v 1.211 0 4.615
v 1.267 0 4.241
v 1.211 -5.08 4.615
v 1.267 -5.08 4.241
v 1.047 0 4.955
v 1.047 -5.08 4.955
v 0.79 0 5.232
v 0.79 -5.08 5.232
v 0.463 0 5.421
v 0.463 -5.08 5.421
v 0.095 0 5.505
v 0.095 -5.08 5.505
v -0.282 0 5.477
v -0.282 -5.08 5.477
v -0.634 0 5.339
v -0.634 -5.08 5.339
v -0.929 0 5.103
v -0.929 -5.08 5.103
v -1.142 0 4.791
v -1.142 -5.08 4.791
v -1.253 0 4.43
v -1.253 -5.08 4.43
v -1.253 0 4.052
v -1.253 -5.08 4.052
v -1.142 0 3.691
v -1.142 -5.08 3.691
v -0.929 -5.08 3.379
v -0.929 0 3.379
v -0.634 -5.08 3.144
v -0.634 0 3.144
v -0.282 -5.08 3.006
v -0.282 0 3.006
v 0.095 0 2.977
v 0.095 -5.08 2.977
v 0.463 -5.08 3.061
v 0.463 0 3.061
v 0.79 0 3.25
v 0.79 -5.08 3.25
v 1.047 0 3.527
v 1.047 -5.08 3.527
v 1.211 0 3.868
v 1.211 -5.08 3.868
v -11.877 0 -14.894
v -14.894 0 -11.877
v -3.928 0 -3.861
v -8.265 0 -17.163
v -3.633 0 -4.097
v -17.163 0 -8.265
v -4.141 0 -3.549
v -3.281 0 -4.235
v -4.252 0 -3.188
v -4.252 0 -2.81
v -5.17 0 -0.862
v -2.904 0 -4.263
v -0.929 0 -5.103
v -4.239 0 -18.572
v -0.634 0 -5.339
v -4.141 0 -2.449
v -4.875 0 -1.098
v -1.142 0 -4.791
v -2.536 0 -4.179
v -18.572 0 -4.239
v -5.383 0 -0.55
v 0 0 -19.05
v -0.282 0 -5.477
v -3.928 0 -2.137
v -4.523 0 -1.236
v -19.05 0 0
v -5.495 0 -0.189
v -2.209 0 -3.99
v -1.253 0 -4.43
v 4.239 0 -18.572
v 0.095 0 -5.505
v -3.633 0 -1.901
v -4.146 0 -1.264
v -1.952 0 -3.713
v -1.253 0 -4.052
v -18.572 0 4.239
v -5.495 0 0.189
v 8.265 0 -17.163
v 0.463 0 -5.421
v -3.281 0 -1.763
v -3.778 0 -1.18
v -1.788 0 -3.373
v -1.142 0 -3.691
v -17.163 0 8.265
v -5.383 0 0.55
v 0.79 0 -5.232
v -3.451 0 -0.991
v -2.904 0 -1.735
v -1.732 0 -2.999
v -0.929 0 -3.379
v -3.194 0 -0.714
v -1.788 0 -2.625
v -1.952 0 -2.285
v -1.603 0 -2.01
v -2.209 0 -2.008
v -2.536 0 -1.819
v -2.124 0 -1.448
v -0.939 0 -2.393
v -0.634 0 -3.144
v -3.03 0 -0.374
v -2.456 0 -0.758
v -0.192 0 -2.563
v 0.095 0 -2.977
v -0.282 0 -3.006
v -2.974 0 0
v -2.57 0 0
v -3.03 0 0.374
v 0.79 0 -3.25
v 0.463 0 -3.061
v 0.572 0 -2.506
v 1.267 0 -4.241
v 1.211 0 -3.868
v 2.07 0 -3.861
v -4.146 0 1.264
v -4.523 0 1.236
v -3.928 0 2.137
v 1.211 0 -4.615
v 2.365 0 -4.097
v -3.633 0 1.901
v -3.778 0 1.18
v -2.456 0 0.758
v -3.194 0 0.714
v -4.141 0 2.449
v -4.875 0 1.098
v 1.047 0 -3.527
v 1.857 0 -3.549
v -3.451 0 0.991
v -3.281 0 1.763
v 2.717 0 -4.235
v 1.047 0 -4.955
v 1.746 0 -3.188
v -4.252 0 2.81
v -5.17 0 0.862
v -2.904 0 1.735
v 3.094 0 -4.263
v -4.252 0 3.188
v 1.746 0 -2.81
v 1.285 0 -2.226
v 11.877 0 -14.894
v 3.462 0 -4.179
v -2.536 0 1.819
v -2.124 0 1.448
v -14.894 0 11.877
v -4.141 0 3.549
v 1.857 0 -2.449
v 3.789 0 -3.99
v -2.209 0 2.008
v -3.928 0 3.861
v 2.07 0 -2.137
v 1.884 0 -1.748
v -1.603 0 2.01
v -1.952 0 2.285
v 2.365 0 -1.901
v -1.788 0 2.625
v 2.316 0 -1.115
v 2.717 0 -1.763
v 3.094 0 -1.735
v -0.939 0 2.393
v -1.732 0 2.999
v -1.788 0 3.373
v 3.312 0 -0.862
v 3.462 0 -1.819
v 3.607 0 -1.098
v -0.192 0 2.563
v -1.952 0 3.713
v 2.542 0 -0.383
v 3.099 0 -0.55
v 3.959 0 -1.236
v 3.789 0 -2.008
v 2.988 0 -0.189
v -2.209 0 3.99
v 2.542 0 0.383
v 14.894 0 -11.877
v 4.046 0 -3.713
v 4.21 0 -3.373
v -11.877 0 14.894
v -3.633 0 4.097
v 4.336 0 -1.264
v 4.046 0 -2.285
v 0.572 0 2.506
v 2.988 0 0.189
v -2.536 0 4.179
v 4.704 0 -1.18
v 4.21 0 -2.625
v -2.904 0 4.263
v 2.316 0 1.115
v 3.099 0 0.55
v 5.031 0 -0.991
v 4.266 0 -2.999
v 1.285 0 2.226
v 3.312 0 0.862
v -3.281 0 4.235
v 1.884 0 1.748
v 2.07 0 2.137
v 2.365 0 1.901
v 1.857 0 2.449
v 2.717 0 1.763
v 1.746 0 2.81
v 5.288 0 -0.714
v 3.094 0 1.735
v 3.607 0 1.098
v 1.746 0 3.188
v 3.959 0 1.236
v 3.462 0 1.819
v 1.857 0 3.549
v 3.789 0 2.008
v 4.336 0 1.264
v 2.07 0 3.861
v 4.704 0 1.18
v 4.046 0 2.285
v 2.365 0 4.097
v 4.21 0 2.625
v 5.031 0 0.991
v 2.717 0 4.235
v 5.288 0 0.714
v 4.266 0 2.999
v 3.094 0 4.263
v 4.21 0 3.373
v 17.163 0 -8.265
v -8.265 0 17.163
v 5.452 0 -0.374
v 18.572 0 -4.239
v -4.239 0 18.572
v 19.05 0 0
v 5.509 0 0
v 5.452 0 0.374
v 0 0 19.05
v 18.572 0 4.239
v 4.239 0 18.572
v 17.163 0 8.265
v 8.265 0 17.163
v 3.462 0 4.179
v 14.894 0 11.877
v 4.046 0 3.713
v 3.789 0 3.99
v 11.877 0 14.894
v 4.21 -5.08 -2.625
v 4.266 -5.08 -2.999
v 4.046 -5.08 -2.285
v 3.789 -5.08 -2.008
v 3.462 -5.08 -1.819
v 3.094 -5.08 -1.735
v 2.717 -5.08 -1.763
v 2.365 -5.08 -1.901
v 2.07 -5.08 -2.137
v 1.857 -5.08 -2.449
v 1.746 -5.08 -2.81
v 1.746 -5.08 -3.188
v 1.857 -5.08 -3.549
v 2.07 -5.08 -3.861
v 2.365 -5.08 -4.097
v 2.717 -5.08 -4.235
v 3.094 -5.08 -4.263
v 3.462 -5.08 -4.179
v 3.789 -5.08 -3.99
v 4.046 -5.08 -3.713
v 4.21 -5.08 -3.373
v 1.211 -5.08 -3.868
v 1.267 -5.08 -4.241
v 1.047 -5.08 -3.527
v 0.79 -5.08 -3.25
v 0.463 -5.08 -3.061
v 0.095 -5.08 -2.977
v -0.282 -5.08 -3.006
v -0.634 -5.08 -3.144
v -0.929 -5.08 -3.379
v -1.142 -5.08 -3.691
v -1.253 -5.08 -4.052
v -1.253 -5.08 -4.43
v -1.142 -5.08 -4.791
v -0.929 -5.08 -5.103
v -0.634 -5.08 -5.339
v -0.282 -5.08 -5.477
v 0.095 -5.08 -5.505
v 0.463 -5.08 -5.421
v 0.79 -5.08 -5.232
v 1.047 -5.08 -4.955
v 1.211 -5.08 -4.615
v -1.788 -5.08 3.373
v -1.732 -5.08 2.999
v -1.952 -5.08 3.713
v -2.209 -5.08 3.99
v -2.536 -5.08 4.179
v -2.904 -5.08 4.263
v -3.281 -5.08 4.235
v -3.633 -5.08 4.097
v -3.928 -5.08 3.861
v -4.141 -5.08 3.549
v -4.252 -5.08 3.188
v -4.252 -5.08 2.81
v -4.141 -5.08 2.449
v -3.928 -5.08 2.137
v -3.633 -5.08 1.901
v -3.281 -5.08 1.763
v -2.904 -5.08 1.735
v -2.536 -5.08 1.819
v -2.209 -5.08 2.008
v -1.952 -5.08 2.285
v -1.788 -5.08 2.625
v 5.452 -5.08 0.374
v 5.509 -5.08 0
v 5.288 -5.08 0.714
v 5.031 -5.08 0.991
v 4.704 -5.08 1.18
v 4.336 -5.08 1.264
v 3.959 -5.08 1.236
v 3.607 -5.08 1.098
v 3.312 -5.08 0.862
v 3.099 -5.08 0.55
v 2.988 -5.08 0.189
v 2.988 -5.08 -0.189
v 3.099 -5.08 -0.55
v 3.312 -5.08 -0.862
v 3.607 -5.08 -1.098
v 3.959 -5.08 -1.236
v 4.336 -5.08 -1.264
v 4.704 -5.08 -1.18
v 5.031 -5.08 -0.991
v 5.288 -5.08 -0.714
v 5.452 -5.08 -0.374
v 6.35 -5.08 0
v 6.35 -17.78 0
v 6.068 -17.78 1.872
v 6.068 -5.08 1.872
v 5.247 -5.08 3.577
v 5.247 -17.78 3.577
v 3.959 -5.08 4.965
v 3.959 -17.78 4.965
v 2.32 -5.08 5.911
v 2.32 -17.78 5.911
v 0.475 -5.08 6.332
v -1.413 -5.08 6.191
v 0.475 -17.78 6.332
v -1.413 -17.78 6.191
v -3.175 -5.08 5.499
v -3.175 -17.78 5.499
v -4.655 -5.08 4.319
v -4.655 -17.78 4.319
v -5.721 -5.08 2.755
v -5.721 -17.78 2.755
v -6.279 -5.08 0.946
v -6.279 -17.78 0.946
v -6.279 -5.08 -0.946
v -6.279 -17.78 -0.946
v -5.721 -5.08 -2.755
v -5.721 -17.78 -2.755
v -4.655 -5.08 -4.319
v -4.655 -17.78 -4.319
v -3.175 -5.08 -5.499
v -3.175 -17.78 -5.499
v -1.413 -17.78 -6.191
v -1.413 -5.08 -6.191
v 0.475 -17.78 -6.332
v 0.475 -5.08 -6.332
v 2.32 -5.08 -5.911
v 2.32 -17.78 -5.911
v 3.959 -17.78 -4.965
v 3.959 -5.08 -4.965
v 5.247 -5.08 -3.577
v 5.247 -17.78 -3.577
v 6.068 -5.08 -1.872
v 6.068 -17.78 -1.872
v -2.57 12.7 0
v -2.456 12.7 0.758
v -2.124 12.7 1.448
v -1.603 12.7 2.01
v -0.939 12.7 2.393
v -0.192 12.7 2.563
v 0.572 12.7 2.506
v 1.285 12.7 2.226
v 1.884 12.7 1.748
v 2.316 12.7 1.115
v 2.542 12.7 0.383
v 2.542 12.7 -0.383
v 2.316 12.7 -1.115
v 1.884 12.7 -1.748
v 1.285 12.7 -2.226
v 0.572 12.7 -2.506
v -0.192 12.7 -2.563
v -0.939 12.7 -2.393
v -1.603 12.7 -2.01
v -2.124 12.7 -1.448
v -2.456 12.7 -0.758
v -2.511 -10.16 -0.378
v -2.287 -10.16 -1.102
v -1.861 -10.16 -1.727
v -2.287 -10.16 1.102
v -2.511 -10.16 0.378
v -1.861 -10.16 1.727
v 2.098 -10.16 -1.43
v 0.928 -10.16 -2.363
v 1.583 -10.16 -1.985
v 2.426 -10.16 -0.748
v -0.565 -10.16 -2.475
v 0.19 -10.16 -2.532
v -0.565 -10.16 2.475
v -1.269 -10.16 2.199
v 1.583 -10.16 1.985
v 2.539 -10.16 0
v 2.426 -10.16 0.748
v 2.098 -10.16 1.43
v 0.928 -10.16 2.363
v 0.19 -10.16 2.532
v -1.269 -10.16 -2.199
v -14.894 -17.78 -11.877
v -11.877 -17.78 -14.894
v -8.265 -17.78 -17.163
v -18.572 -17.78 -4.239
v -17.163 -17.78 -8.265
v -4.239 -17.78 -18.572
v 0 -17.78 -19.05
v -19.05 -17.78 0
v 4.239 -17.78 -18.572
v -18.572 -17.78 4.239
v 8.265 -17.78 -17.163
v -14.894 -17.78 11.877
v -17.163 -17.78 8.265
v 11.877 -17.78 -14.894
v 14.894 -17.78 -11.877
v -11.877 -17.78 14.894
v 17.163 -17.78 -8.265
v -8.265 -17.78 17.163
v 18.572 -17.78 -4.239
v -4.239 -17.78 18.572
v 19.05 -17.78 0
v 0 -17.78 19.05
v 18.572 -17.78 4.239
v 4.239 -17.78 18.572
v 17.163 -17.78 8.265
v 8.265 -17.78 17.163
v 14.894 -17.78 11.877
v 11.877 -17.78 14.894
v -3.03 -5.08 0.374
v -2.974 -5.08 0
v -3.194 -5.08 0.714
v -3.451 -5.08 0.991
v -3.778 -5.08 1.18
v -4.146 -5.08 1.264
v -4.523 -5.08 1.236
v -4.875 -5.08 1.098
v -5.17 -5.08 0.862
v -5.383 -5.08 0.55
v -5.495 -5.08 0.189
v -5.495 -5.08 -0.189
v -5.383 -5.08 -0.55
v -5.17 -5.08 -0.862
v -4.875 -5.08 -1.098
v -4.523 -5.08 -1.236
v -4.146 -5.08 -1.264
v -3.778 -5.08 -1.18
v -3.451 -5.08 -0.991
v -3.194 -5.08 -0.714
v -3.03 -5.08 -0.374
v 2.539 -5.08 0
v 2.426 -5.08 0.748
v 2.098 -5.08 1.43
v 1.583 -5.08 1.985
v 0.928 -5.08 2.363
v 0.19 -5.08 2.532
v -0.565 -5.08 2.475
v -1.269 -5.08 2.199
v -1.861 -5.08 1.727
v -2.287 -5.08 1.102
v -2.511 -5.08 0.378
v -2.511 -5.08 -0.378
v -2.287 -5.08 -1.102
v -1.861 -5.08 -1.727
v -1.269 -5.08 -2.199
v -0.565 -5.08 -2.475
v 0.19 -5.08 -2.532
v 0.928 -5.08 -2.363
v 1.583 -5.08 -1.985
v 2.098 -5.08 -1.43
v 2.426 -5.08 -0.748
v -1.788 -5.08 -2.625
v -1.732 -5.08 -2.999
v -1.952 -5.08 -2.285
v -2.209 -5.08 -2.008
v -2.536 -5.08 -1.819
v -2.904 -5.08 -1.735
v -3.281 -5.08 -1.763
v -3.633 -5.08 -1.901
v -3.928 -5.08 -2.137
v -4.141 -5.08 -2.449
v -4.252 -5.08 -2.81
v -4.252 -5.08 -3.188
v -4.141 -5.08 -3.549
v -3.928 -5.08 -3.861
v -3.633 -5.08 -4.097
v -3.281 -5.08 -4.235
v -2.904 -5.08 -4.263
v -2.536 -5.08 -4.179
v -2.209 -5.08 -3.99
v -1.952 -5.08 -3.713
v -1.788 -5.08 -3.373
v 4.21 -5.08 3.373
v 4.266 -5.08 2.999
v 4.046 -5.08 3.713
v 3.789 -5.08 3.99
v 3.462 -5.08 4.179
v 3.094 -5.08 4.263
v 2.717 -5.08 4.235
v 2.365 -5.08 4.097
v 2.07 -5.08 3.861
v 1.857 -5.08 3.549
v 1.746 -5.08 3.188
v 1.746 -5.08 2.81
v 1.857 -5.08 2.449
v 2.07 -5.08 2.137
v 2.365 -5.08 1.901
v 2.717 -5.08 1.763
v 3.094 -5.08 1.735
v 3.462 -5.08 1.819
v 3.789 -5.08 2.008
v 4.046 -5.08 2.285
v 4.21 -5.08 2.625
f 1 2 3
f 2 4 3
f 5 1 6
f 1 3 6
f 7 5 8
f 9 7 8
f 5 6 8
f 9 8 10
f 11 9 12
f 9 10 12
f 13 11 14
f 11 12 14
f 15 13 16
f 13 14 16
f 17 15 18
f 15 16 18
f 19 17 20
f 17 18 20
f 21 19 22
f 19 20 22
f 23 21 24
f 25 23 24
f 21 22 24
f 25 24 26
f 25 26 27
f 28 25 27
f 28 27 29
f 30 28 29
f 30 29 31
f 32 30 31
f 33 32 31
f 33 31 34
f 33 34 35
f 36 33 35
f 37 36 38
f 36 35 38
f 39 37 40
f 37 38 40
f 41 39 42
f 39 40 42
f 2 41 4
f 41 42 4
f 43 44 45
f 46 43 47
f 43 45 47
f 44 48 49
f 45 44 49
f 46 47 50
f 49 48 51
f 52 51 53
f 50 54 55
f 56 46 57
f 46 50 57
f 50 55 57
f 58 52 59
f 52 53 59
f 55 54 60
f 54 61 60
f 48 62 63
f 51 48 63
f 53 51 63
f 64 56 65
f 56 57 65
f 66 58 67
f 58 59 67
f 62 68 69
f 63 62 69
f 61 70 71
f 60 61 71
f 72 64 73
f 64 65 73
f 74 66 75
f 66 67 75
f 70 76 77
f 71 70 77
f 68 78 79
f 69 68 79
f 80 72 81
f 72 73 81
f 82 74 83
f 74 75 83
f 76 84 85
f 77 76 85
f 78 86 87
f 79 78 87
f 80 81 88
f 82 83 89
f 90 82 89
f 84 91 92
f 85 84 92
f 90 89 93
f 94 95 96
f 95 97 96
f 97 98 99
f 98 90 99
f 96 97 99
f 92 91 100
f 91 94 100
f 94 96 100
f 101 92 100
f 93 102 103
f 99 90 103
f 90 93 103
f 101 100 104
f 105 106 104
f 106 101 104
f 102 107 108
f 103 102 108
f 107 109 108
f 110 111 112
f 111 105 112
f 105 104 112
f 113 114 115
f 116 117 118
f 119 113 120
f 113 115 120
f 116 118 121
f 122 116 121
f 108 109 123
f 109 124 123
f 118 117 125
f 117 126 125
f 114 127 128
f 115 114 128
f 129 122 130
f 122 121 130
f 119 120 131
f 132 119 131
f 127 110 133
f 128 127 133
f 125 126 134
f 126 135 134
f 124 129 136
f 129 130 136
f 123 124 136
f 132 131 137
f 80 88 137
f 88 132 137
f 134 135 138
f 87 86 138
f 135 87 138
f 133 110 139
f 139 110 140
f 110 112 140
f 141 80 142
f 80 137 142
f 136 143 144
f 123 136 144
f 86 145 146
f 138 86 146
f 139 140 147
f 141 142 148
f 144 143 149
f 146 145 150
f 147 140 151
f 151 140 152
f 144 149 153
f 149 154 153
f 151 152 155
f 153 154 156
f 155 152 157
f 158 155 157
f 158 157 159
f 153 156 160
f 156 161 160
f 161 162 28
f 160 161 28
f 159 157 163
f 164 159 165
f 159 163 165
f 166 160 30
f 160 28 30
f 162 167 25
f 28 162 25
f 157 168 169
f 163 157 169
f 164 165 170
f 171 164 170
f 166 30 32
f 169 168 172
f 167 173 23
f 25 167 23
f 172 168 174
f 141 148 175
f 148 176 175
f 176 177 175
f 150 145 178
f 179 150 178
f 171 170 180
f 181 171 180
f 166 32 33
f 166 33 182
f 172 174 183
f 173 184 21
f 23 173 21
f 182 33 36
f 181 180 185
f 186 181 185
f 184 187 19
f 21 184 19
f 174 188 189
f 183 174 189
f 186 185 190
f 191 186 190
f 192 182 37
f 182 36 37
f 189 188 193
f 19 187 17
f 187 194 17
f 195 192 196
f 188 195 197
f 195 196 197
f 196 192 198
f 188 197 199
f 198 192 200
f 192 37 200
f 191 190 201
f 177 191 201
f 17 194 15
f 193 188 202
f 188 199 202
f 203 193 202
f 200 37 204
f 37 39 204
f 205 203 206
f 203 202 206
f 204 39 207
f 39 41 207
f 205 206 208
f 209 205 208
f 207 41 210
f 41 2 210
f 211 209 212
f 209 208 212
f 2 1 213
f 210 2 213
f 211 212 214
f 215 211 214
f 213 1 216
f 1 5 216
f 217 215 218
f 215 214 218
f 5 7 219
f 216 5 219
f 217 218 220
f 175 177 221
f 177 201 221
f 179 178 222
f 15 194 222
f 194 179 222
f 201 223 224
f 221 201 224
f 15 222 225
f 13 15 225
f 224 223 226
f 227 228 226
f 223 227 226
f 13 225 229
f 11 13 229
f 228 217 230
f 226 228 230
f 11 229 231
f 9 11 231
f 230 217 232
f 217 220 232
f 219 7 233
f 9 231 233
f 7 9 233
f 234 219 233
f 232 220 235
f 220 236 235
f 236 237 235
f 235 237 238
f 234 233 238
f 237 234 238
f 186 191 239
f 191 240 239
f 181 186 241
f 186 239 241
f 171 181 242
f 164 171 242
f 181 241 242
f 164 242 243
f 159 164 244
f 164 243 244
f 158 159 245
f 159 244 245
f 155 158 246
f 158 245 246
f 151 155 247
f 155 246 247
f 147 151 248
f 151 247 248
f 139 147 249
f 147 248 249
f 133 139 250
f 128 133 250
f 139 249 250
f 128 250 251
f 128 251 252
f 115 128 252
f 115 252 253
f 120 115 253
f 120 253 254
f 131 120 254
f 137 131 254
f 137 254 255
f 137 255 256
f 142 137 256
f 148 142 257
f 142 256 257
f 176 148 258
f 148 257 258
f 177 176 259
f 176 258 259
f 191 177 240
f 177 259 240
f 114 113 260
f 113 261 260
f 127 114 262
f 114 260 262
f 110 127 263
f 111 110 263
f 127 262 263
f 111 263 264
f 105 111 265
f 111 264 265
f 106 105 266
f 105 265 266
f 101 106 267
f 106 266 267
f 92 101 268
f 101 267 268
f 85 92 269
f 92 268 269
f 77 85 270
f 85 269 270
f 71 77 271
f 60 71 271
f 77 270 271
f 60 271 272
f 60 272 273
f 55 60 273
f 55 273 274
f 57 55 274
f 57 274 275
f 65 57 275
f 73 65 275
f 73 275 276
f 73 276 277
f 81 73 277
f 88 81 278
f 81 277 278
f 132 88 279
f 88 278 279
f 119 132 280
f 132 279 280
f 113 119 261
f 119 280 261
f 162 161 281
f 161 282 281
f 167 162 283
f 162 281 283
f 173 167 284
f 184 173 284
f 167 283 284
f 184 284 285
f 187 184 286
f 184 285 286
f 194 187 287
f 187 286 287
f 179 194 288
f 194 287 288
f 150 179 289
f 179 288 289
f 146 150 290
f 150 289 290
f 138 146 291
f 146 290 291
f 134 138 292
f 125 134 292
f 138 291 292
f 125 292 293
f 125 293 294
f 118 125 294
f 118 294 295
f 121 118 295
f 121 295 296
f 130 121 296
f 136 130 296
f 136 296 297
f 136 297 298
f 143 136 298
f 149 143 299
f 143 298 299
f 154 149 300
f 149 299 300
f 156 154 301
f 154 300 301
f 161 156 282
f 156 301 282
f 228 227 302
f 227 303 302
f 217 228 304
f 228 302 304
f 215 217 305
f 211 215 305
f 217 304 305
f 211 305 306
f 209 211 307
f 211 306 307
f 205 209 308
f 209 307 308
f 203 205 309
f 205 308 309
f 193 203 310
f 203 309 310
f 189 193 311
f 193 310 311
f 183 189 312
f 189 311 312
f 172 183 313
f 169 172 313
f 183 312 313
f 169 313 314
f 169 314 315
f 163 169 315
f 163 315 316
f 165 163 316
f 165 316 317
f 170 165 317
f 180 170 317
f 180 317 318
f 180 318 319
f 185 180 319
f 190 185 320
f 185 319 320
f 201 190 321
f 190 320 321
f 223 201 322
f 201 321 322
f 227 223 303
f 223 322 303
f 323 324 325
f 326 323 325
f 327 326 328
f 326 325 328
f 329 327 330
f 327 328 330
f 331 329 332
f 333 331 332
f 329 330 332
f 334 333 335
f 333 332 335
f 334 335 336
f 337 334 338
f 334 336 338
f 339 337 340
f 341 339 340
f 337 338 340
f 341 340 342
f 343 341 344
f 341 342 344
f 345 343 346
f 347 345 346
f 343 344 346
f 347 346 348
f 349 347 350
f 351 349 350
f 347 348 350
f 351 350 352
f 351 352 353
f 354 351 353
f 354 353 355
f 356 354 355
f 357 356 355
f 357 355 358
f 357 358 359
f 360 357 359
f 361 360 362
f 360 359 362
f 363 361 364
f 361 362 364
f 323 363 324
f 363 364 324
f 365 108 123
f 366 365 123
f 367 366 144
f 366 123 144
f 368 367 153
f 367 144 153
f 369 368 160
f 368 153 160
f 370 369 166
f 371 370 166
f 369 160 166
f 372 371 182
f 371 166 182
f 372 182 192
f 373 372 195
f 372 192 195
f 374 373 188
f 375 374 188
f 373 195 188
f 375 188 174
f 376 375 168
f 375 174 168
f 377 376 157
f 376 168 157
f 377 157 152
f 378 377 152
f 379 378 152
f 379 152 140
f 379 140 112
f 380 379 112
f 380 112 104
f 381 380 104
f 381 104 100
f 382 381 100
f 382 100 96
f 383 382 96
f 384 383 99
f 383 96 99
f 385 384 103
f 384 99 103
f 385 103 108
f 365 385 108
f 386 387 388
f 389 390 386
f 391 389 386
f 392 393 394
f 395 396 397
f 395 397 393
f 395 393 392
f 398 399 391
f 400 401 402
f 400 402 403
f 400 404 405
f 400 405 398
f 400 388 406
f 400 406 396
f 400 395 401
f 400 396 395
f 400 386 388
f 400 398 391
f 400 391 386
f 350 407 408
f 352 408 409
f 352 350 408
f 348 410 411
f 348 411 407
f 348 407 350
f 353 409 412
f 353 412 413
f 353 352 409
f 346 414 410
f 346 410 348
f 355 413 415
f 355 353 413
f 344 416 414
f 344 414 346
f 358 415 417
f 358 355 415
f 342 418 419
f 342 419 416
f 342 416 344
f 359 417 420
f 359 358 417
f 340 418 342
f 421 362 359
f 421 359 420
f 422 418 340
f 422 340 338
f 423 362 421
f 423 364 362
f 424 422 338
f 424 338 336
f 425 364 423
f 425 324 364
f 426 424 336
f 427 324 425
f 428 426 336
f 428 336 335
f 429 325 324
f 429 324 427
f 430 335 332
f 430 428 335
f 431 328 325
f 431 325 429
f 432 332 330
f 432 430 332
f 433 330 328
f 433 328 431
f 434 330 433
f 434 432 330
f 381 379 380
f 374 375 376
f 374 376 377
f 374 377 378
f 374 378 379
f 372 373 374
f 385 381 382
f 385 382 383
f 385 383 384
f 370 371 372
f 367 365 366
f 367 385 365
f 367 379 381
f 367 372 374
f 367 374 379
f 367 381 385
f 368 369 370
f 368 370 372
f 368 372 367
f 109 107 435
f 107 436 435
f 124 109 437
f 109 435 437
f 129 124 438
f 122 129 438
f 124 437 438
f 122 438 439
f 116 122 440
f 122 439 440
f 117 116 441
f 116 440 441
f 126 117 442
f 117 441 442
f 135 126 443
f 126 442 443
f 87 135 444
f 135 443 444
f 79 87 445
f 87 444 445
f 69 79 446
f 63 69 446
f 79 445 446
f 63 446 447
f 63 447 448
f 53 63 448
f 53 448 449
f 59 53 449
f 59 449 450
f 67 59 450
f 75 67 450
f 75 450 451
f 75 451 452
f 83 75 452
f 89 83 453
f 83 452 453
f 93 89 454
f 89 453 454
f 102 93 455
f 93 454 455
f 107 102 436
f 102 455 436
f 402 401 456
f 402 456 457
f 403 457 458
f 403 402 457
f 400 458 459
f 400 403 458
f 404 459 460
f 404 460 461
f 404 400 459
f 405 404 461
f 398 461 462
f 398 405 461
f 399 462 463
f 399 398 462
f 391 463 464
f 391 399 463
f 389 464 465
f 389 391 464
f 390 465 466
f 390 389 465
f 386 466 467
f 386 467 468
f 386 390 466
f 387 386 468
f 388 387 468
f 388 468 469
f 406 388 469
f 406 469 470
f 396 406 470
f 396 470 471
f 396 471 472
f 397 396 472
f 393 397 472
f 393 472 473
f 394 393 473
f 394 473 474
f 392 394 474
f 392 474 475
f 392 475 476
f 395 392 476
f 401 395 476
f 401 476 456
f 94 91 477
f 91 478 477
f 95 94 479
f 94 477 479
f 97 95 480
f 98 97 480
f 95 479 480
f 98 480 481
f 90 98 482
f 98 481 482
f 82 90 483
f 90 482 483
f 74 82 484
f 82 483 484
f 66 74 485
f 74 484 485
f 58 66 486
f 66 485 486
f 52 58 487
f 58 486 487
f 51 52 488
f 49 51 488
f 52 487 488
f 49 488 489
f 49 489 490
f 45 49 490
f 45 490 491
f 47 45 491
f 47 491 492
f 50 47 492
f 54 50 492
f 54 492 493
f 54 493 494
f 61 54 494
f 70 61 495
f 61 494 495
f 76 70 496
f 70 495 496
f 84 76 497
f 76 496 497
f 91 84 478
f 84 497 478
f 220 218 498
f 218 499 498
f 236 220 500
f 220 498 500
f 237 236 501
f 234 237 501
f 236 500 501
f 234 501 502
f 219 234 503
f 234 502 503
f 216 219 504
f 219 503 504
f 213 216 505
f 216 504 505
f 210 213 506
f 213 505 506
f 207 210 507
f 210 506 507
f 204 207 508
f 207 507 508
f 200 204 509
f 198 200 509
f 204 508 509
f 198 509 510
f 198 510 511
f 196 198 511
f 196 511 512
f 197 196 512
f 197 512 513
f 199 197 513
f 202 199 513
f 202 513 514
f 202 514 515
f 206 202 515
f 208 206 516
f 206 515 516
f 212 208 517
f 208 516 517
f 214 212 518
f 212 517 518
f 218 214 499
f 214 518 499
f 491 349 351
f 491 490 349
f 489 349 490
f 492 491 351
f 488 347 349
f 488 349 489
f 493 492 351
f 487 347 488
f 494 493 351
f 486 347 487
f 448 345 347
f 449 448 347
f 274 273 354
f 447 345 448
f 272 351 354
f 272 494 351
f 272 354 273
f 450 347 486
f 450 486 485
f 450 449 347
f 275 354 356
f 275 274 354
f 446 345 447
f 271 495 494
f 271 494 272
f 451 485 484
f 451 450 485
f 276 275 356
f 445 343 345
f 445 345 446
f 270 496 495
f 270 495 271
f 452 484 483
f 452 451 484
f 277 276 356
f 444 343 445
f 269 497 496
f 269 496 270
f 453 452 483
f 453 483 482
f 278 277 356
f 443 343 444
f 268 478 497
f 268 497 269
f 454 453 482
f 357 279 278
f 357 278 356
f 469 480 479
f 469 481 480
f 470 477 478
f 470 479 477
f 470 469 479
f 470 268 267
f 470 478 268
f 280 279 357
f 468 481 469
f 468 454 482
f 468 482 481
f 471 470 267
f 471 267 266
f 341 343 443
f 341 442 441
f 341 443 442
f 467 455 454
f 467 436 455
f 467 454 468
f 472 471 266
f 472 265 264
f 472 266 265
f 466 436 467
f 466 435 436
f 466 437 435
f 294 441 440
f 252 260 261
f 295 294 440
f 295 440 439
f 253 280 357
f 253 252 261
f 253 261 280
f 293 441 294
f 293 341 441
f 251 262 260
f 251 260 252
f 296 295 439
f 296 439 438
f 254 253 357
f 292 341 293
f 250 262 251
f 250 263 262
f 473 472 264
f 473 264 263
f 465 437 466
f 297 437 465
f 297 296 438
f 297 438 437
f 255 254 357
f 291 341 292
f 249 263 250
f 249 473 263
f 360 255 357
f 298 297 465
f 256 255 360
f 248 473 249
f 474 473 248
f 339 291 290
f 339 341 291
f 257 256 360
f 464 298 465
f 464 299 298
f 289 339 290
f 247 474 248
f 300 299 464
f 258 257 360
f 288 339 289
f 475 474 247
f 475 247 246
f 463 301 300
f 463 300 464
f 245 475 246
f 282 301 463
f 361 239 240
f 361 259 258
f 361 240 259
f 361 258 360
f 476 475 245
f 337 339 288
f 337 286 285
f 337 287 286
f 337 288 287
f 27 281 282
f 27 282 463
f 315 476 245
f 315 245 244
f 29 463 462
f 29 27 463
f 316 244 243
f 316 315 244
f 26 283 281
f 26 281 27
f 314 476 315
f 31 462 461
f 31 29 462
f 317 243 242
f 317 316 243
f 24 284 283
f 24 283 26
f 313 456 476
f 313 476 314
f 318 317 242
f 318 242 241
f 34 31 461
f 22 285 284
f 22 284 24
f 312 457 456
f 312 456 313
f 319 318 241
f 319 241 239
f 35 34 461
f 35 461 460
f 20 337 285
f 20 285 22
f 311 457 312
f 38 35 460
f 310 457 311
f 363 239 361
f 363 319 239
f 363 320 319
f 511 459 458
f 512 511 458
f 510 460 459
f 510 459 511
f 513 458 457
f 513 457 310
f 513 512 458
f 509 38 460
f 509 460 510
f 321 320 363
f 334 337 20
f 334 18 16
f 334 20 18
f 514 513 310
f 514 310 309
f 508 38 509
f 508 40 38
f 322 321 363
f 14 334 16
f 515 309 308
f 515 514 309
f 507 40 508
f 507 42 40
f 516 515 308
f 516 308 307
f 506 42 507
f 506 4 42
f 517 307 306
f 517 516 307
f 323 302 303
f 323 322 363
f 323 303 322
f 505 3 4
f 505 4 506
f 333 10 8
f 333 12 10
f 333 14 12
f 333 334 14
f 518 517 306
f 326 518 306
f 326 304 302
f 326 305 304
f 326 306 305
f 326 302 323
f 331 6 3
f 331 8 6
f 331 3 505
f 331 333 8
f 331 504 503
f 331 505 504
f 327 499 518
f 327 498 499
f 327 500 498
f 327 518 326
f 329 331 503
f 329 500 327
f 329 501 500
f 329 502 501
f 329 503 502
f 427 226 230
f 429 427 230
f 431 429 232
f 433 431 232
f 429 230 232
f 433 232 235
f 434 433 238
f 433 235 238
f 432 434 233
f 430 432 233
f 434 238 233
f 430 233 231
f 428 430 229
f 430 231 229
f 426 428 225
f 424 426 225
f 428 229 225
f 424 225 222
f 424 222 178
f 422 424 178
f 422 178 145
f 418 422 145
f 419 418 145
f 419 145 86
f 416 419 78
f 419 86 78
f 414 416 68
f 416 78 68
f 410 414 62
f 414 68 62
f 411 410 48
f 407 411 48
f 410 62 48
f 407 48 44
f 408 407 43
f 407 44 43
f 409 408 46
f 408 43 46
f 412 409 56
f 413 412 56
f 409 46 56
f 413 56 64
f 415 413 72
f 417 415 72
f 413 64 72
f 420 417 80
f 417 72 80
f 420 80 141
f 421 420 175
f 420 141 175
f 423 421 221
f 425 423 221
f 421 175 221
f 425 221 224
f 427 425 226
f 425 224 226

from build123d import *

# Parameters (mm, degrees)
F0_R      = 19.05
F1_DEPTH  = 17.78
F4_R      = 6.35
F4_R_2    = 2.5388917956
F5_DEPTH  = 12.7
F2_R      = 2.5388917956
F2_R_2    = 2.4229582781
F6_DEPTH  = 7.62
F8_R      = 1.2674888325
F9_DEPTH  = 2.54
F10_DEPTH = 25.4
F11_R     = 2.5702523623
F3_R      = 2.519460743
F12_DEPTH = 12.7


# Not quite as in the source:
# - a feature of the source that left no trace in its solid (it failed there, or was rolled back) is left out


with BuildPart() as f1:
    # F0 (on Front) → F1 (new body)
    with BuildSketch(Plane.XZ):
        Circle(F0_R)
    extrude(amount=F1_DEPTH)

    # F4 (on face) → F5 (cut)
    with BuildSketch(Plane.XZ.offset(17.78)):
        Circle(F4_R)
        Circle(F4_R_2, mode=Mode.SUBTRACT)
    extrude(amount=-F5_DEPTH, mode=Mode.SUBTRACT)

    # F2 (on face) → F6 (cut)
    with BuildSketch(Plane.XZ.offset(17.78)):
        Circle(F2_R)
        Circle(F2_R_2, mode=Mode.SUBTRACT)
        Circle(F2_R_2)
    extrude(amount=-F6_DEPTH, mode=Mode.SUBTRACT)

    # F8 (on face) → F9 (cut)
    with BuildSketch(Plane.XZ.offset(5.08)):
        with Locations((-4.2412145995, 0)):
            Circle(F8_R)
        with Locations((-2.9989916037, 2.9989916037)):
            Circle(F8_R)
        with Locations((0, 4.2412145995)):
            Circle(F8_R)
        with Locations((2.9989916037, 2.9989916037)):
            Circle(F8_R)
        with Locations((4.2412145995, 0)):
            Circle(F8_R)
        with Locations((2.9989916037, -2.9989916037)):
            Circle(F8_R)
        with Locations((0, -4.2412145995)):
            Circle(F8_R)
        with Locations((-2.9989916037, -2.9989916037)):
            Circle(F8_R)
    extrude(amount=-F9_DEPTH, mode=Mode.SUBTRACT)

    # F10 (cut): faces of the model
    f10_faces = [f1.faces().sort_by_distance(p)[0] for p in [
        (-2.9989916037, -2.54, 2.9989916037),
        (-4.2412145995, -2.54, 0),
        (-2.9989916037, -2.54, -2.9989916037),
        (0, -2.54, -4.2412145995),
        (2.9989916037, -2.54, -2.9989916037),
        (4.2412145995, -2.54, 0),
        (2.9989916037, -2.54, 2.9989916037),
        (0, -2.54, 4.2412145995),
    ]]
    extrude(f10_faces, amount=-F10_DEPTH, mode=Mode.SUBTRACT)

    # F11 (on face) + F3 (on face) → F12 (join)
    with BuildSketch(Plane(origin=(0, 0, 0), x_dir=(-1, 0, 0), z_dir=(0, 1, 0))):
        Circle(F11_R)
    with BuildSketch(Plane(origin=(0, 0, 0), x_dir=(-1, 0, 0), z_dir=(0, 1, 0))):
        Circle(F3_R)
    extrude(amount=F12_DEPTH)


solid = f1.part
